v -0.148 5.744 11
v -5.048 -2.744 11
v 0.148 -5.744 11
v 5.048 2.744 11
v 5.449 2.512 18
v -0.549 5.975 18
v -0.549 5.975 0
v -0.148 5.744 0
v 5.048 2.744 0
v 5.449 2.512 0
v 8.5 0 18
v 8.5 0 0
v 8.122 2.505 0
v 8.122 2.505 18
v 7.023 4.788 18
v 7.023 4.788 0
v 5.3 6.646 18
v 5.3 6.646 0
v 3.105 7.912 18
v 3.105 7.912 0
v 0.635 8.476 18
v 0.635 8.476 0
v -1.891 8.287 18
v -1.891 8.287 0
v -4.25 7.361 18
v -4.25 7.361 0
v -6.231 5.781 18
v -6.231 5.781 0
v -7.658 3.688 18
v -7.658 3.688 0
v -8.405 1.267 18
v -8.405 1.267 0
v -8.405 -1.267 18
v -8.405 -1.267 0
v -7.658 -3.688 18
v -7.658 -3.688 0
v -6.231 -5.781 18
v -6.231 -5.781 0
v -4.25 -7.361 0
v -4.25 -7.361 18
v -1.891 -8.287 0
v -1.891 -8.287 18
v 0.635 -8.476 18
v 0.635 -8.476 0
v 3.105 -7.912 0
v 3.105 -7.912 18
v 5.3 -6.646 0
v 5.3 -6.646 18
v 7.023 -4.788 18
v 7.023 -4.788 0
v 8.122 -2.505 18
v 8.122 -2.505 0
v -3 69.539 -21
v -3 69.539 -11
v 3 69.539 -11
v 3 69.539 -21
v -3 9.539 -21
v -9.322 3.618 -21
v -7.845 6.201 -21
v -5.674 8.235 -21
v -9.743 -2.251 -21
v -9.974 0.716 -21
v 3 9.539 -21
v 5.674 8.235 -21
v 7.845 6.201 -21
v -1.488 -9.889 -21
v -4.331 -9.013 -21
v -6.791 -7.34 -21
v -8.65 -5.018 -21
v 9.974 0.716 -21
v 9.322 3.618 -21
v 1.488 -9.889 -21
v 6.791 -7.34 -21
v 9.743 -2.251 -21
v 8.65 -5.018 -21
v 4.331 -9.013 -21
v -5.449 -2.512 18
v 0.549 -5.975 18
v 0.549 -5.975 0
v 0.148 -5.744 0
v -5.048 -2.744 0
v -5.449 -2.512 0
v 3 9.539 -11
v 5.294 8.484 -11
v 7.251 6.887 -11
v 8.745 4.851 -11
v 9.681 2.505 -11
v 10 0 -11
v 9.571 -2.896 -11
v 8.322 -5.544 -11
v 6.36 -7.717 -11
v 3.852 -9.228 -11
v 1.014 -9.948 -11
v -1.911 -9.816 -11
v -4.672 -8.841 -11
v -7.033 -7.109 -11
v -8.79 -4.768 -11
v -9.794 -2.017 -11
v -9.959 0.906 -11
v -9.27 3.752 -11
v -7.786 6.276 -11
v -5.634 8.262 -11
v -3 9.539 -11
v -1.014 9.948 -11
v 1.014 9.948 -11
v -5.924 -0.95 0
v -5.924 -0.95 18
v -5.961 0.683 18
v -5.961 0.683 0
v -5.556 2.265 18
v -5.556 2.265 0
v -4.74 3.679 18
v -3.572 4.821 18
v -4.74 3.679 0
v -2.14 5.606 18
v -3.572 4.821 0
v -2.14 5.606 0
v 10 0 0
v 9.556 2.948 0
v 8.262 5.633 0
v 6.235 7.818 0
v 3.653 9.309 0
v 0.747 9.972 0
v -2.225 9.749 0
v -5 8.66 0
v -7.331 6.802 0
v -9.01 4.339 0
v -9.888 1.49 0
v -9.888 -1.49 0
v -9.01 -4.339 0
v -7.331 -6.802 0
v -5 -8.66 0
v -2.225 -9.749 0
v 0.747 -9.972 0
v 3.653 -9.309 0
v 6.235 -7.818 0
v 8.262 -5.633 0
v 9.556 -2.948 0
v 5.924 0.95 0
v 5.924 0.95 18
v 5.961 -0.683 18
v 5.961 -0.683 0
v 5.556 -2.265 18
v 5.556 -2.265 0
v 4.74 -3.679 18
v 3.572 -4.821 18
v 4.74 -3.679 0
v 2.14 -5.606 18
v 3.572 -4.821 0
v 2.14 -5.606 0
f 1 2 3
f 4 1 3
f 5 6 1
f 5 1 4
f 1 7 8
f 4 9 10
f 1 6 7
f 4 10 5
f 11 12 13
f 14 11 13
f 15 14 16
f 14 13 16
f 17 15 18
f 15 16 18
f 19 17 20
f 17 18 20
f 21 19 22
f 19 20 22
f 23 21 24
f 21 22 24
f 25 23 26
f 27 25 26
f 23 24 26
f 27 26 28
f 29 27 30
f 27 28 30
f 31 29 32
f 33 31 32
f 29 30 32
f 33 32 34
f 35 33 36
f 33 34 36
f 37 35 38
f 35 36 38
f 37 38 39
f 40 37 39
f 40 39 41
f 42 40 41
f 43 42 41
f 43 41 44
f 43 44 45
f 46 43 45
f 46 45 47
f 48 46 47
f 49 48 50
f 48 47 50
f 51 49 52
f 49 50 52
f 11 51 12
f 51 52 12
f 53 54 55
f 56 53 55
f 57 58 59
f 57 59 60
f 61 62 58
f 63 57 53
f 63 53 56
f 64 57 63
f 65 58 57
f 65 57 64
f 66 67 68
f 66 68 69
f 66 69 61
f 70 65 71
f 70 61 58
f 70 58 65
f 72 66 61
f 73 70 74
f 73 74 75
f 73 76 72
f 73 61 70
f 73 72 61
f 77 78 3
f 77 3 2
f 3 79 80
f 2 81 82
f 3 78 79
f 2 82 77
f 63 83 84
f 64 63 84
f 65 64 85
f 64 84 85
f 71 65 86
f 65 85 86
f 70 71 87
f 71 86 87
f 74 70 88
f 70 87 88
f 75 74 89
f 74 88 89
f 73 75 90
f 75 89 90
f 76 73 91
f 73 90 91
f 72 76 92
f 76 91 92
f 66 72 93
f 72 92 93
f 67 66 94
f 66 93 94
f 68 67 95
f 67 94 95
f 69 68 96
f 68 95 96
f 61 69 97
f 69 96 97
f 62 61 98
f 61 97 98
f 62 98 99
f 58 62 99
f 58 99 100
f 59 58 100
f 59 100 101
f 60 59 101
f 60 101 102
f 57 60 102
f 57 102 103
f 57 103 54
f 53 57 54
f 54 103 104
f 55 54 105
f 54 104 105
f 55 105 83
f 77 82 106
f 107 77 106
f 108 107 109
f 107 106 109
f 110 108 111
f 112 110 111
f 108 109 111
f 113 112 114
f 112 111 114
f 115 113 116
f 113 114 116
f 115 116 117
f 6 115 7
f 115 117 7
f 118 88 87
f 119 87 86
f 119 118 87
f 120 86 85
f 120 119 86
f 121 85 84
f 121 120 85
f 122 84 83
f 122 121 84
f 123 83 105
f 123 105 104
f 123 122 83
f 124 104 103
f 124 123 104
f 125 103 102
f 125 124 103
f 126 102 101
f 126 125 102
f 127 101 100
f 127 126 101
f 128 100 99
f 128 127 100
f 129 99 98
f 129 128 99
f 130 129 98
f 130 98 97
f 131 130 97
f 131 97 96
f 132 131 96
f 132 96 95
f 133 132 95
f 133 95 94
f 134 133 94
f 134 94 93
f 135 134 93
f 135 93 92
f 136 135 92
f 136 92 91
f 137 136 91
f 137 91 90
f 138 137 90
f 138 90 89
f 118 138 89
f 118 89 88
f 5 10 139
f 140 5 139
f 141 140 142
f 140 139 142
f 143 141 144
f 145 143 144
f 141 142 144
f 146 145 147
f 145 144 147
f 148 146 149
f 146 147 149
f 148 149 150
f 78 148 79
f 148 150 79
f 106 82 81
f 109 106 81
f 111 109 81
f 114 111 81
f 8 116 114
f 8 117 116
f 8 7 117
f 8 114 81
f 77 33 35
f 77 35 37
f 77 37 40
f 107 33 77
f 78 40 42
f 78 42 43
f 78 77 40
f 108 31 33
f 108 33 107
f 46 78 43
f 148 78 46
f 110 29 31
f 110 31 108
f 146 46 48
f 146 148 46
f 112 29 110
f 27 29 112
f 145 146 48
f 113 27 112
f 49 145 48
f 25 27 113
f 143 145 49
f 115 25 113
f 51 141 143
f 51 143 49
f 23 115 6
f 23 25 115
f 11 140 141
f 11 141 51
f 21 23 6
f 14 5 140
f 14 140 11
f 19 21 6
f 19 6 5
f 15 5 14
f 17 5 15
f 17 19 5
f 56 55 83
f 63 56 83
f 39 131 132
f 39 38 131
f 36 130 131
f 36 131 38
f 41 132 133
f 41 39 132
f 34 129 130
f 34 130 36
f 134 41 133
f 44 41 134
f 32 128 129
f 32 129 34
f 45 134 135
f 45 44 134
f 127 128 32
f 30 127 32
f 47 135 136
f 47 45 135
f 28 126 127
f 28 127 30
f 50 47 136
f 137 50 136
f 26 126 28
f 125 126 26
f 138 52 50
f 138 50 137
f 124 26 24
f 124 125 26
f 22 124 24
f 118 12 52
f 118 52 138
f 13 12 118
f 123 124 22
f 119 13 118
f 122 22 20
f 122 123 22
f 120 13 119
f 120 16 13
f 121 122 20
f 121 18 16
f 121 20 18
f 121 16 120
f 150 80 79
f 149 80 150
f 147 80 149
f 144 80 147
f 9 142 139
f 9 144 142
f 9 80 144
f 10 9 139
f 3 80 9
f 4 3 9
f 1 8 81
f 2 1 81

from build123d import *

# Parameters (mm, degrees)
F0_R     = 8.5
F1_DEPTH = 18
F3_DEPTH = 11
F4_R     = 10
F5_DEPTH = 11
F7_DEPTH = 10


with BuildPart() as f1:
    # F0 (on Top) → F1 (new body)
    with BuildSketch(Plane.XY):
        Circle(F0_R)
        with BuildLine():
            ThreePointArc((-5.44875, -2.512196), (-5.196152, 3), (-0.54875, 5.974853))
            Line((-0.54875, 5.974853), (5.44875, 2.512196))
            ThreePointArc((5.44875, 2.512196), (5.196152, -3), (0.54875, -5.974853))
            Line((0.54875, -5.974853), (-5.44875, -2.512196))
        make_face(mode=Mode.SUBTRACT)
    extrude(amount=F1_DEPTH)

    # F2 (on Top) → F3 (join)
    with BuildSketch(Plane.XY):
        Polygon((0.509195, 6.881952), (-5.705348, -3.881952), (-0.509195, -6.881952), (0, -6), (5.705348, 3.881952), align=None)
    extrude(amount=F3_DEPTH)

    # F4 (on Top) → F5 (join)
    with BuildSketch(Plane.XY):
        Circle(F4_R)
    extrude(amount=-F5_DEPTH)

    # F6 (on face) → F7 (join)
    with BuildSketch(Plane(origin=(0, 0, -11), x_dir=(1, 0, 0), z_dir=(0, 0, -1))):
        with BuildLine():
            Line((3, -69.539392), (3, -9.539392))
            ThreePointArc((3, -9.539392), (0, 10), (-3, -9.539392))
            Line((-3, -9.539392), (-3, -69.539392))
            Line((-3, -69.539392), (3, -69.539392))
        make_face()
    extrude(amount=F7_DEPTH)


solid = f1.part
